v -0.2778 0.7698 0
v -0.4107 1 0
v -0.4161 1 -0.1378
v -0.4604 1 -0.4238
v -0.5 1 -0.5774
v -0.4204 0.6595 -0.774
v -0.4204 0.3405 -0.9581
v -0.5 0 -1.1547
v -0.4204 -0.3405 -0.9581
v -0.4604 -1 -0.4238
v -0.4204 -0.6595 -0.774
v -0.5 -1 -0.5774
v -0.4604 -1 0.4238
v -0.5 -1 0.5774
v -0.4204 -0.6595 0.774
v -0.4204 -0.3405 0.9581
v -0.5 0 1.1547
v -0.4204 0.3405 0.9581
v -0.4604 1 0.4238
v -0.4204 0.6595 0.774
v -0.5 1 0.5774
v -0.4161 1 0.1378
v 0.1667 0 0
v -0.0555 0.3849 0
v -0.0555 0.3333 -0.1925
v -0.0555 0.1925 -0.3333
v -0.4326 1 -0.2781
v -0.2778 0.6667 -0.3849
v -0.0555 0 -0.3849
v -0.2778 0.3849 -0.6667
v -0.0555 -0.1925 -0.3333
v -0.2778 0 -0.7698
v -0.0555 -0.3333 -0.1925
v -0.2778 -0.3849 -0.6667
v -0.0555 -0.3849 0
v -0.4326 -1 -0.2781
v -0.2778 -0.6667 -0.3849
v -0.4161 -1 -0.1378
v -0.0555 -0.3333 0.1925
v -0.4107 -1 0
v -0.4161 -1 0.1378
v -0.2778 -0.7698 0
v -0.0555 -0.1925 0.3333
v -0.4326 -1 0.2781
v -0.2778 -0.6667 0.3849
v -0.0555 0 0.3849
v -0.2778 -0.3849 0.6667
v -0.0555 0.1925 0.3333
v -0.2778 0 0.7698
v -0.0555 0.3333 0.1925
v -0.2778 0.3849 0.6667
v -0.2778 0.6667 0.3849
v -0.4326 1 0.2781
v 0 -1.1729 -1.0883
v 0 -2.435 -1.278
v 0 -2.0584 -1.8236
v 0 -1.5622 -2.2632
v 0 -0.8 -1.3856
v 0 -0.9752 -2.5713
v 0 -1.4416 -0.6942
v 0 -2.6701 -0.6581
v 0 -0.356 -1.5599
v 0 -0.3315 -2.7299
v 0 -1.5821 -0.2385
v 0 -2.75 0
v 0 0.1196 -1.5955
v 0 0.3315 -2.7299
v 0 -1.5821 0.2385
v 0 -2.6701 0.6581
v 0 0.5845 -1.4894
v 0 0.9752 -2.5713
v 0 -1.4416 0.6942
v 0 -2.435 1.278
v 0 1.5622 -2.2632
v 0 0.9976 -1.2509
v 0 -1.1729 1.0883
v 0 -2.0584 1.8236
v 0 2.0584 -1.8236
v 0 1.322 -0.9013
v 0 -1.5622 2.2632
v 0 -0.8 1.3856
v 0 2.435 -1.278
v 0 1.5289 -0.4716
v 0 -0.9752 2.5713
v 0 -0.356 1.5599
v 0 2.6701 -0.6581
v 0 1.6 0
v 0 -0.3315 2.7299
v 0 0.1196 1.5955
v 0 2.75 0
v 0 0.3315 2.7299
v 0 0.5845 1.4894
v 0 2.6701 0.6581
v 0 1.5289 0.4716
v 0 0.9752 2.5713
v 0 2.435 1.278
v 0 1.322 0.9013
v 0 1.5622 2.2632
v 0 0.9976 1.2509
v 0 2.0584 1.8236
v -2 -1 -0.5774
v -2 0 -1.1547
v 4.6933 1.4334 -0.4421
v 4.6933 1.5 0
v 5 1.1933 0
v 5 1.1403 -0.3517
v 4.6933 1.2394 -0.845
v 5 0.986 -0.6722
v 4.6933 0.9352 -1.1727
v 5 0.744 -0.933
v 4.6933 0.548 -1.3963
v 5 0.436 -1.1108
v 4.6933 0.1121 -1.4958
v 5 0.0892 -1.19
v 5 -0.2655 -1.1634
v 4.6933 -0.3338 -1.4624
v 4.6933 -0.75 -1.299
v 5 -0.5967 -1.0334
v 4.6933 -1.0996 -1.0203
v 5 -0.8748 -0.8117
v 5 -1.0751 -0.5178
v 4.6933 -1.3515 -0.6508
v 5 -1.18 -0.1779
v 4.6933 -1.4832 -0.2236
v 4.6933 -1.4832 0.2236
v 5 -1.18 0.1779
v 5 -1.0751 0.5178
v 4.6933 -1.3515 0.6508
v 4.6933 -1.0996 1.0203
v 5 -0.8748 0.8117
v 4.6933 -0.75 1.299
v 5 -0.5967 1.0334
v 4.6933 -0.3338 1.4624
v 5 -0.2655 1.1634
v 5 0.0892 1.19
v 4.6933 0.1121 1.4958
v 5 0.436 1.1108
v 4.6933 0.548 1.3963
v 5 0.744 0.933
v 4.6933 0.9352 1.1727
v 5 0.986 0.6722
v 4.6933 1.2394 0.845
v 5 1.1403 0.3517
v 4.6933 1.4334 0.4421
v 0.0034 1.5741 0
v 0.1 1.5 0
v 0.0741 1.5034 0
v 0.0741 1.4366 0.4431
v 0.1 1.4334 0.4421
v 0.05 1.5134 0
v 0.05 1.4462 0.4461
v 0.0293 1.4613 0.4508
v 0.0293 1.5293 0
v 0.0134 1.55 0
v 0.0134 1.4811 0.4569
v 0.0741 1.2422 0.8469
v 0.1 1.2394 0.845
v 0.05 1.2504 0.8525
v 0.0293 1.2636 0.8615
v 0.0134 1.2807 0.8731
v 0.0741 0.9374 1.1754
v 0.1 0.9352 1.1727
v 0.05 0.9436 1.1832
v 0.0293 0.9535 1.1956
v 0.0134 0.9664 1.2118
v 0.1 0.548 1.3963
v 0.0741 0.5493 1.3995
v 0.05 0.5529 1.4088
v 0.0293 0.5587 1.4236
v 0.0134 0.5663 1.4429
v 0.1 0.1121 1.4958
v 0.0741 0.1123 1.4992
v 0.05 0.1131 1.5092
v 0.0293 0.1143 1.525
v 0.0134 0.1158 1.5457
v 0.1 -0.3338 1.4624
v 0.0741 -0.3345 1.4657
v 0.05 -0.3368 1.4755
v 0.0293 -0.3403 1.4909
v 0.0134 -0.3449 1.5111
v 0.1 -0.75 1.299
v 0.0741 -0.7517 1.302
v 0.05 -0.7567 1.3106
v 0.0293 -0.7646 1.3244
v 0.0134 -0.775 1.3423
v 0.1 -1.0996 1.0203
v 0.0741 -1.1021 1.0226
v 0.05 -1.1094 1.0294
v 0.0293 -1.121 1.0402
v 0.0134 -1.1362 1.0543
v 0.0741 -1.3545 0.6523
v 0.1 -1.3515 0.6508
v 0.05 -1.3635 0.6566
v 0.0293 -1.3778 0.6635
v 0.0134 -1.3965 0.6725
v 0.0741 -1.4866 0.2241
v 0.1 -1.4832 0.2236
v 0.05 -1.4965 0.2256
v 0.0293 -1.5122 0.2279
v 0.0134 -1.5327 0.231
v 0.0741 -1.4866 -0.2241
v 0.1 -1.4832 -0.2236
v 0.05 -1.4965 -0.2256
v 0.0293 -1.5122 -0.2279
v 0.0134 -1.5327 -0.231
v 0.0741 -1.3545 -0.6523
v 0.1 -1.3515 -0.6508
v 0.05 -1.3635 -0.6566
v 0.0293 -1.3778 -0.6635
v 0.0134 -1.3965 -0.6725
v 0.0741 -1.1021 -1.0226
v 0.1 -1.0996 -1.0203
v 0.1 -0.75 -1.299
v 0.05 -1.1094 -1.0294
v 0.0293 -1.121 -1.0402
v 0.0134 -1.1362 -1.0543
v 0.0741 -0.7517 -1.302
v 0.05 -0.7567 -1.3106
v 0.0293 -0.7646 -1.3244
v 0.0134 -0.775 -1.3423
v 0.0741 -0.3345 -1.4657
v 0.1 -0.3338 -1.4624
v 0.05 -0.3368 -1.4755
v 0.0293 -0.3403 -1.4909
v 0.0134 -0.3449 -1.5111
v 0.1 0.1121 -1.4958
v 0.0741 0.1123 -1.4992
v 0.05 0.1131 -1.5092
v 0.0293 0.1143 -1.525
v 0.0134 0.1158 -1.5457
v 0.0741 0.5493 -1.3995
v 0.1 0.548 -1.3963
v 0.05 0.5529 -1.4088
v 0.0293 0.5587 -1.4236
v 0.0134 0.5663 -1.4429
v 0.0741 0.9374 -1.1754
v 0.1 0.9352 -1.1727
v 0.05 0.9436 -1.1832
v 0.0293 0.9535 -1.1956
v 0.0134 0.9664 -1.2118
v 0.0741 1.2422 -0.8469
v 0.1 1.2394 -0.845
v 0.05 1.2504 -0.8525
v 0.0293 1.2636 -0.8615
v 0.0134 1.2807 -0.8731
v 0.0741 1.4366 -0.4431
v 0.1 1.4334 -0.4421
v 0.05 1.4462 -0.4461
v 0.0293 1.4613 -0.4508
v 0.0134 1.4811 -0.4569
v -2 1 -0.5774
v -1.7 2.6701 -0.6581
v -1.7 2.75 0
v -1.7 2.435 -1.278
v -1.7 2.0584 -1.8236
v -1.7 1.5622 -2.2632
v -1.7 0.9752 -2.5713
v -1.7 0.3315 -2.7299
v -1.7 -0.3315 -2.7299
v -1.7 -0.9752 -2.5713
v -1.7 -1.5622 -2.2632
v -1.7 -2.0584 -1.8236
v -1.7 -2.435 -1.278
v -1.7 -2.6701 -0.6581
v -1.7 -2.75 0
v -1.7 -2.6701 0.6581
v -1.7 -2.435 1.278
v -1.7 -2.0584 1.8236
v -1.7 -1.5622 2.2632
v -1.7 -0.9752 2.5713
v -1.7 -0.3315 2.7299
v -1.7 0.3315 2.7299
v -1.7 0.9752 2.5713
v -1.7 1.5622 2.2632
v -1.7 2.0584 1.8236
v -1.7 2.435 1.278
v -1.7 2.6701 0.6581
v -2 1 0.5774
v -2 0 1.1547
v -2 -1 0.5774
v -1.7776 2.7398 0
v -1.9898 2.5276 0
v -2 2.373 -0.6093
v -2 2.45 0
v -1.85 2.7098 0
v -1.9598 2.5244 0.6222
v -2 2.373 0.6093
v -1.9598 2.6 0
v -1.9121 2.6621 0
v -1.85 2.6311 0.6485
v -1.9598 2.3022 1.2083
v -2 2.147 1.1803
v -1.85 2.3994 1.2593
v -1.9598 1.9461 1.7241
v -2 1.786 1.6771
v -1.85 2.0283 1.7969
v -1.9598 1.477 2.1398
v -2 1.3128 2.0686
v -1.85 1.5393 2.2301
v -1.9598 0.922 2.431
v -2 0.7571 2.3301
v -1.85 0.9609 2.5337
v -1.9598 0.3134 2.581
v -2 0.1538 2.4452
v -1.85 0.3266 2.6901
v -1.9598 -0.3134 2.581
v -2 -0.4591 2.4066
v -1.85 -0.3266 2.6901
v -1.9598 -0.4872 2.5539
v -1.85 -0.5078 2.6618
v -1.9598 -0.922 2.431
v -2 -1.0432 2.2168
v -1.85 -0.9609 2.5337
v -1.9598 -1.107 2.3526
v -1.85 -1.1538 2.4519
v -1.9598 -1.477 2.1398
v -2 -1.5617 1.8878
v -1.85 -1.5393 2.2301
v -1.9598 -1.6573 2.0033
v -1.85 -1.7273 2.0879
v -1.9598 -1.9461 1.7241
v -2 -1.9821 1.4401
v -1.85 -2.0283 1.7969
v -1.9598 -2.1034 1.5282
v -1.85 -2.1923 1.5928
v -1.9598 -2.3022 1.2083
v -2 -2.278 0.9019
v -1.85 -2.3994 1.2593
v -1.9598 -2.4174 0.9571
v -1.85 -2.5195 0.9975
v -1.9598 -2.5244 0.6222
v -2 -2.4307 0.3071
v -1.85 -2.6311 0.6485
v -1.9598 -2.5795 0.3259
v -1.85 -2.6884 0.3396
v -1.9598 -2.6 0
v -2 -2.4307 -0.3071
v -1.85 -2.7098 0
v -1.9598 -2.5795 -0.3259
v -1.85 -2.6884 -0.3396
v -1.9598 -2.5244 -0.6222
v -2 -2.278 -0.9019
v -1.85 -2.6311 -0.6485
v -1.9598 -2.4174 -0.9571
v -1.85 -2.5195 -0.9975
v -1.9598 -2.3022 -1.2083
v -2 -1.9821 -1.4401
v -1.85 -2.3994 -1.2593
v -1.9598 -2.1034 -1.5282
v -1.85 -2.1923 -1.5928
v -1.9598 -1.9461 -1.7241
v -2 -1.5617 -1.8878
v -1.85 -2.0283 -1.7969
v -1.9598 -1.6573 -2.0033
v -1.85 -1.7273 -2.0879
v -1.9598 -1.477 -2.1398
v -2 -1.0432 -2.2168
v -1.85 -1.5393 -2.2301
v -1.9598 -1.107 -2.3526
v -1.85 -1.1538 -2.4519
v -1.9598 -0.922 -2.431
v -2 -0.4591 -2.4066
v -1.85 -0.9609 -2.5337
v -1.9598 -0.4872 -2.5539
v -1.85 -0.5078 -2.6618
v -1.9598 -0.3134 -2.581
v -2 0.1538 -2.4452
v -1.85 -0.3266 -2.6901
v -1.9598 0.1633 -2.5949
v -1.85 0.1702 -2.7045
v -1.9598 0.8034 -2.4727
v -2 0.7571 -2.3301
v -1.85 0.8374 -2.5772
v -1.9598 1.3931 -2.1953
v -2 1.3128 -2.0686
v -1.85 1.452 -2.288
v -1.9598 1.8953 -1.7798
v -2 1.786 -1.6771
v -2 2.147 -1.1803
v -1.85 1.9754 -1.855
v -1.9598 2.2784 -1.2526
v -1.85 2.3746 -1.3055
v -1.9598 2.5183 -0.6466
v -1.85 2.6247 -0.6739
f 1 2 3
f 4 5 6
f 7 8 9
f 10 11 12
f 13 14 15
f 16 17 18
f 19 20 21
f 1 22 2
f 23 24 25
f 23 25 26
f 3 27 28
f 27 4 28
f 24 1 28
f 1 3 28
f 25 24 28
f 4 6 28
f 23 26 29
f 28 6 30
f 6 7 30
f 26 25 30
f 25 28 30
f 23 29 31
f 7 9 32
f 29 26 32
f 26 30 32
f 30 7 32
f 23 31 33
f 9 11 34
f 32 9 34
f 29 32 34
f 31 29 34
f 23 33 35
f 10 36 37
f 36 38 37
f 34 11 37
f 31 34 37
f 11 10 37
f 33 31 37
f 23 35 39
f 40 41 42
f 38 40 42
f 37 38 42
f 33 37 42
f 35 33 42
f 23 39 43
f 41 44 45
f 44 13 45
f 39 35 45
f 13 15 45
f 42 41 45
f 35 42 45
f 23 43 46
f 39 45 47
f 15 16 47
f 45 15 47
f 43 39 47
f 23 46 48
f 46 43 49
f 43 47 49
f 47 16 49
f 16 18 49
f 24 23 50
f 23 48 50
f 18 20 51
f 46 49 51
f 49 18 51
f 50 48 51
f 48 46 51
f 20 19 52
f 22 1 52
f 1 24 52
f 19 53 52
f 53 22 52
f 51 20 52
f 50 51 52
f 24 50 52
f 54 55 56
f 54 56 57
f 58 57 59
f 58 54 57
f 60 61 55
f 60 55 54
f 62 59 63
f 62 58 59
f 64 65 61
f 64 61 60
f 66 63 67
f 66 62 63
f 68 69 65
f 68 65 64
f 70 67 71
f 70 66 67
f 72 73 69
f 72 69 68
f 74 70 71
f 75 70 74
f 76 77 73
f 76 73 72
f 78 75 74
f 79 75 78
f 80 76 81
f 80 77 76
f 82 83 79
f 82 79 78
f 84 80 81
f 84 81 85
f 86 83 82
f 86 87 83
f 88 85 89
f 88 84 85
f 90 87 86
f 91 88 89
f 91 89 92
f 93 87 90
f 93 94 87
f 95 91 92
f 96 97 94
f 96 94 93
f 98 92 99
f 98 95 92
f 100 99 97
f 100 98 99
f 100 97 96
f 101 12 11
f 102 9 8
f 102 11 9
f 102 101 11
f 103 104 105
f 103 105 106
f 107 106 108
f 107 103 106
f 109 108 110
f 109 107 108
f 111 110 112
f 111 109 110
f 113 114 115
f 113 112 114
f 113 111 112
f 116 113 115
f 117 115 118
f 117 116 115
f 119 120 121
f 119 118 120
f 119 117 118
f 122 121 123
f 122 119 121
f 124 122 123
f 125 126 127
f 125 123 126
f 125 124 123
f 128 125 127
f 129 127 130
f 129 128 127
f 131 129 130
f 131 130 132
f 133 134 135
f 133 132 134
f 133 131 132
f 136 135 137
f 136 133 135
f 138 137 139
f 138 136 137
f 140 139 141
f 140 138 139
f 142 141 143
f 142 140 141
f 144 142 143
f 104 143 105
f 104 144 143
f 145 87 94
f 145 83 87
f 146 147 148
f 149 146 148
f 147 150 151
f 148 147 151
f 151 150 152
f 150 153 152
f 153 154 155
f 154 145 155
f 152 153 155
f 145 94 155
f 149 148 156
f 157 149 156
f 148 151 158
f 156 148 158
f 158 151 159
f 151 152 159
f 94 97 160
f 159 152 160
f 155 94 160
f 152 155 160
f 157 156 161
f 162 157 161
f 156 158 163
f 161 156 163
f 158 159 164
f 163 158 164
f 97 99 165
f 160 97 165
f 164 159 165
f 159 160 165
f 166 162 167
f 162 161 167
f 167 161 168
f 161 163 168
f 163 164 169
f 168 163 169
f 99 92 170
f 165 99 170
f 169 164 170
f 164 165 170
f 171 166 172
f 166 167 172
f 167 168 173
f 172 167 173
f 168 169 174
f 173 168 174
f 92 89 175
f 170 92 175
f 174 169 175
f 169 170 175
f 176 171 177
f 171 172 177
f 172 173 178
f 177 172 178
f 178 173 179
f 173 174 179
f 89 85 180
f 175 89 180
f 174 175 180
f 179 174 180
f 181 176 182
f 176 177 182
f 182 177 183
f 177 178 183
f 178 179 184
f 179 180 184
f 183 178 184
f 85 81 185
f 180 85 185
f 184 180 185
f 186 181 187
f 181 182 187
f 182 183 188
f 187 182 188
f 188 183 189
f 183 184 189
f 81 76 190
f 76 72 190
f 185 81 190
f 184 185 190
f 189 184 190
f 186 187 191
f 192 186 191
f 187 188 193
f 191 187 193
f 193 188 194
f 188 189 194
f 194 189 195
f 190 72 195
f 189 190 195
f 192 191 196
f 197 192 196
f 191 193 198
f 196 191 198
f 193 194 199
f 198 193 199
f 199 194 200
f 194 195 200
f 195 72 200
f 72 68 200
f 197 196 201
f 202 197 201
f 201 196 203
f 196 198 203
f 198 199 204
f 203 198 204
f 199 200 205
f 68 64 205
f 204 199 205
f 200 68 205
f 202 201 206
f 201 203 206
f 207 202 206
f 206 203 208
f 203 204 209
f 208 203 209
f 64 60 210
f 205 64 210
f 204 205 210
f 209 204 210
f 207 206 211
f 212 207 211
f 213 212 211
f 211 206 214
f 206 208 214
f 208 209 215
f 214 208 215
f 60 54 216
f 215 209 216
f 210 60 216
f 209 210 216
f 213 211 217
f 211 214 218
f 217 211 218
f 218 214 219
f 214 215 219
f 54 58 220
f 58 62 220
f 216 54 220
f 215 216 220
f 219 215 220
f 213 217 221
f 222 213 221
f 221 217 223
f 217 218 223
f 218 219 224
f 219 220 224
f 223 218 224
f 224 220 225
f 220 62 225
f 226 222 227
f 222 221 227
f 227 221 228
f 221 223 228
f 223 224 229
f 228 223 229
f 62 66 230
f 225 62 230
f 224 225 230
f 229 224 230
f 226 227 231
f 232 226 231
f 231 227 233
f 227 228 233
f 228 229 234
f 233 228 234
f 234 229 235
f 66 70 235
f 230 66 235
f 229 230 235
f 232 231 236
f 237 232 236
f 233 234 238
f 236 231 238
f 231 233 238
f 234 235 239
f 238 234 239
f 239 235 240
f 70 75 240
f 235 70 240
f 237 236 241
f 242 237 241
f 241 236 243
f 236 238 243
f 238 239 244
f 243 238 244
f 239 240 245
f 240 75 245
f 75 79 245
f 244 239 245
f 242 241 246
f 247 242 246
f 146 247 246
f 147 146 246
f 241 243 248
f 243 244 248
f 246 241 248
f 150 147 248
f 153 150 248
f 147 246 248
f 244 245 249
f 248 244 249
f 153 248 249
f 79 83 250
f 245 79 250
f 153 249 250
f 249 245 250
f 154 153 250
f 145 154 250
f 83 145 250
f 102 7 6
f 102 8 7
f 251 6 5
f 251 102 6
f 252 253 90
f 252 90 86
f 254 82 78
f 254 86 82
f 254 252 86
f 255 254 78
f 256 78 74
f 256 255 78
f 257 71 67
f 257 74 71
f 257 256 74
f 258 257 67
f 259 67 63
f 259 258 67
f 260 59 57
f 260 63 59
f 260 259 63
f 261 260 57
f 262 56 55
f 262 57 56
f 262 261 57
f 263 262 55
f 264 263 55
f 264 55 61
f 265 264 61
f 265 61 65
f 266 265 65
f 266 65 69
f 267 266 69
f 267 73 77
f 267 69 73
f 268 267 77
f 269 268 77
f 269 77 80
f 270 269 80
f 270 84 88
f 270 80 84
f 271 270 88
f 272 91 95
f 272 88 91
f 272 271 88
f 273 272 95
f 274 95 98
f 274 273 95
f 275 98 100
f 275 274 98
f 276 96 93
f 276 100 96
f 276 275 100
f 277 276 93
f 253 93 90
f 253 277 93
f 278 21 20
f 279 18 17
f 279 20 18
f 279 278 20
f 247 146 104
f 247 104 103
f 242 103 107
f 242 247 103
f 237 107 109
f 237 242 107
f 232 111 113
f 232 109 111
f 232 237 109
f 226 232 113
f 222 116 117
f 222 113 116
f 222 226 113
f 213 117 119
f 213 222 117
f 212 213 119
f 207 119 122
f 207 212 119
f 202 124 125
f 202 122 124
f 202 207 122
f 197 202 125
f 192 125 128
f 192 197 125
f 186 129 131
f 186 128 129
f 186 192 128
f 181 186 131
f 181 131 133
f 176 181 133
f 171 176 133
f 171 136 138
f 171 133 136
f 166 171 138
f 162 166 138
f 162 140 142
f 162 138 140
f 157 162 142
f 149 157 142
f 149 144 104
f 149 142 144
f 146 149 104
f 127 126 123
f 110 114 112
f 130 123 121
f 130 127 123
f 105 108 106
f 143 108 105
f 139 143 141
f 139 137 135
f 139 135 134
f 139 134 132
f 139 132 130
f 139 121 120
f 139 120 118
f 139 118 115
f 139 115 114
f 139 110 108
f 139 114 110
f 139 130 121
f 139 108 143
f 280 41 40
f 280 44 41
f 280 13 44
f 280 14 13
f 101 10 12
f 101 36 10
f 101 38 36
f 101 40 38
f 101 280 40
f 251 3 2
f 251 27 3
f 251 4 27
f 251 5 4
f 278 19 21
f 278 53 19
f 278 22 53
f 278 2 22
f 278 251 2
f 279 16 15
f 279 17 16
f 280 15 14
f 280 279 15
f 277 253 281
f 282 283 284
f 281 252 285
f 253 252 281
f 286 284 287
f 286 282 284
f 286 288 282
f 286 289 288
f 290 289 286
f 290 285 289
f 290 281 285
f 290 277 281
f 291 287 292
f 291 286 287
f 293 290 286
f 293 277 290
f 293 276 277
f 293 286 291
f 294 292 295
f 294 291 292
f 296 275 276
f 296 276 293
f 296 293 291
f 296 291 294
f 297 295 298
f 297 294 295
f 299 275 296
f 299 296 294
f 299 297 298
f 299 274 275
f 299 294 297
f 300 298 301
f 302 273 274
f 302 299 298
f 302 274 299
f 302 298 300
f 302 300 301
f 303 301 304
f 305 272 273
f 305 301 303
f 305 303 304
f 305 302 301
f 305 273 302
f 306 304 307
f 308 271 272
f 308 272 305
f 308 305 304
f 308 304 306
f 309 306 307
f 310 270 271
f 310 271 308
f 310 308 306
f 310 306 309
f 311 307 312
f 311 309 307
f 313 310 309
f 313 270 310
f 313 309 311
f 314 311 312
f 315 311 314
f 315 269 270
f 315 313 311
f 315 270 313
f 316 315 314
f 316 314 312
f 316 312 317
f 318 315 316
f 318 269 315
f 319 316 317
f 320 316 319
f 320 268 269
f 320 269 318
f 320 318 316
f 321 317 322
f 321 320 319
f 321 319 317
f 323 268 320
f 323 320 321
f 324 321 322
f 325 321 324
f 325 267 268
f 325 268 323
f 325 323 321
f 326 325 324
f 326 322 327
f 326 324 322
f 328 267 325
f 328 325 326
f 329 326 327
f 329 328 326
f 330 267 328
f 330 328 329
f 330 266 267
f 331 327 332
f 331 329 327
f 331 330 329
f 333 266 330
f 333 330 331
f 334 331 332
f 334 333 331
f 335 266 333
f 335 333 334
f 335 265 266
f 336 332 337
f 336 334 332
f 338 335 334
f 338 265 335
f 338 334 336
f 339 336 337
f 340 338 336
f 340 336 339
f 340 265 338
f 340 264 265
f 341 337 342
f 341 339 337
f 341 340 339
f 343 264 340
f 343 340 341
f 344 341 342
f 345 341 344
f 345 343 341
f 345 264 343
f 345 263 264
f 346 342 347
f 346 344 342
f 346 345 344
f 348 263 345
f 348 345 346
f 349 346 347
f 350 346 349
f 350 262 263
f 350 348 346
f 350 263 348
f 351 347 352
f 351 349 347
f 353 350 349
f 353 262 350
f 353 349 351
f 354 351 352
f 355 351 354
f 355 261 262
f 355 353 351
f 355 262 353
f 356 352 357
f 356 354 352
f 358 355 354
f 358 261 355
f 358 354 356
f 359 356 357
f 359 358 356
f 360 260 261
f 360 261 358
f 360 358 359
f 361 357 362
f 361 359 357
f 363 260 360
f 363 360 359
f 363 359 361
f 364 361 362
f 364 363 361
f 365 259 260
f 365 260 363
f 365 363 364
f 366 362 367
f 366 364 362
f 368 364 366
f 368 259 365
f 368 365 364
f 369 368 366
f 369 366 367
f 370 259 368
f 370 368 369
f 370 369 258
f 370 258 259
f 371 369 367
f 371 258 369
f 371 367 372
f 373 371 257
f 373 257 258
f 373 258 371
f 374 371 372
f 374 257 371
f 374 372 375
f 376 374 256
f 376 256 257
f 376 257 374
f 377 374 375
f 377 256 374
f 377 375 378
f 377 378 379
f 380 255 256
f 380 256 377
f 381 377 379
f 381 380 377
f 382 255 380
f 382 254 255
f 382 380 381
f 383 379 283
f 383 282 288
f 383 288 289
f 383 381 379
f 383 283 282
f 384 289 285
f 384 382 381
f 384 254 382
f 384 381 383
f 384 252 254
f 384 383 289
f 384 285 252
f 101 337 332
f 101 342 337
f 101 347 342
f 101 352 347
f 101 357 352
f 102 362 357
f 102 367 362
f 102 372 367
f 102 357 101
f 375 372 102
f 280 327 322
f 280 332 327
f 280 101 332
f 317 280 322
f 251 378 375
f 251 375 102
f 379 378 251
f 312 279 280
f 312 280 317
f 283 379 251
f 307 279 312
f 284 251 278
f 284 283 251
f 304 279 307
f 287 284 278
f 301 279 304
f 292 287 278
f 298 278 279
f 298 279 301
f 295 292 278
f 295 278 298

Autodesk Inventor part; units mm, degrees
ref_plane "YZ Plane" through (0, 0, 0) normal (1, 0, 0) x (0, 1, 0)
ref_plane "XZ Plane" through (0, 0, 0) normal (0, 1, 0) x (-1, 0, 0)
sketch "Sketch1" plane through (0, 0, 0) normal (0, 0, 1) x (1, 0, 0)
  line L0 (0.1667, 0) -> (5, 0)
  line L1 (5, 0) -> (5, 1.5)
  line L2 (5, 1.5) -> (1.5, 1.5)
  line L3 (1.5, 1.5) -> (1.1932, 1.5)
  line L4 (1.1932, 1.5) -> (0, 1.5)
  line L5 (0, 1.5) -> (0, 2.75)
  line L6 (0, 2.75) -> (-2, 2.75)
  line L7 (-2, 2.75) -> (-2, 1.1547)
  line L8 (-2, 1.1547) -> (-0.5, 1.1547)
  line L9 (-0.5, 1.1547) -> (0.1667, 0)
  line L10 (-3.4, 0) -> (6.4, 0) projected
  line L11 (0, -0.55) -> (0, 3.3) projected
  line L12 (1.5, 1.5) -> (0, 1.5) construction
  dimension "d1" = 3.5
  dimension "d2" = 0.3068
  dimension "d3" = 2
  dimension "d4" = 1.5
  dimension "d5" = 60
  dimension "d6" = 3
  dimension "d7" = 3
  dimension "d8" = 2.3094
  dimension "d9" = 5.5
  dimension "d26" = 5
revolve "Body" add sketch "Sketch1" angle 360 about axis through (0.1667, 0, 0) along (1, 0, 0) contours L9 L11 L4 L3 L2 L1 L0 | L9 L8 L7 L6 L5 L11
sketch "Sketch2" plane through (-2, 0, 0) normal (-1, 0, 0) x (0, 0, 1)
  circle A0 centre (0, 0) radius 1.1547 projected
  line L0 (0, -3.85) -> (0, 3.85) projected
  line L1 (-3.85, 0) -> (3.85, 0) projected
  line L2 (1.1547, 0) -> (0.5774, -1)
  line L3 (0.5774, -1) -> (-0.5774, -1)
  line L4 (-0.5774, -1) -> (-1.1547, 0)
  line L5 (-1.1547, 0) -> (-0.5774, 1)
  line L6 (-0.5774, 1) -> (0.5774, 1)
  line L7 (0.5774, 1) -> (1.1547, 0)
extrude "Slot" add sketch "Sketch2" against normal up to next contours L7 A0 | A0 L2 | L6 L0 A0 | A0 L0 L3 | L0 L6 A0 | A0 L3 L0 | L4 A0 | A0 L5
fillet "Fillet1" radius 0.3 1 edges at (-2, -2.75, 0)
thread "Thread" size "M3x0.5" class "6g" standard "ISO Metric profile" length 3.5
chamfer "Chamfer1" distance 0.3067 distance2 0.3067 1 edges at (5, -1.5, 0) measured on face at (5, -0.2617, -0.7882)
ref_plane "Work Plane1" through (29, 0, 0) normal (0, -1, 0) x (1, 0, 0)
fillet "Fillet2" radius 0.1 1 edges at (0, -1.5, 0)
equation "\"d1\" = GEL"
equation "\"d3\" = KOH"
equation "\"d4\" = INTI"
equation "\"d6\" = GD"
equation "\"d7\" = BDM"
equation "\"d8\" = 1.1547 * SW"
equation "\"d9\" = KOD"
equation "\"d26\" = NLG"
equation "\"d30\" = R"
equation "\"d17\" = RR"
equation "\"d13\" = GEL"
equation "\"d15\" = -0.5 * SPD + 0.5 * GD"
equation "\"d16\" = GUL"
equation "\"GD\" = NND"
equation "\"NLG\" = 5"
equation "\"GEL\" = 3.5"
equation "\"KOD\" = 5.5"
equation "\"KOH\" = 2"
equation "\"INTI\" = 1.5"
equation "\"GAL\" = 0.61345 * PTC"
equation "\"GUL\" = 0.61345 * PTC"
equation "\"BDM\" = NND"
equation "\"SW\" = 2"
equation "\"RR\" = 0.3"
equation "\"SPD\" = NND - 1.2269 * PTC"
equation "\"R\" = 0.1"
equation "\"TOA\" = 30deg"
equation "\"GD1\" = THREADDIA - 1.2269 * PTC"
equation "\"THREADDIA\" = 3"
equation "\"FAWI\" = 45deg"
equation "\"ANG\" = 120deg"
equation "\"PTC\" = 0.5"
equation "\"NND\" = 3"
equation "\"E0\" = 1.155 * SW"
properties part number "DIN 7984 - M3 x 5" material "Steel, Mild"
